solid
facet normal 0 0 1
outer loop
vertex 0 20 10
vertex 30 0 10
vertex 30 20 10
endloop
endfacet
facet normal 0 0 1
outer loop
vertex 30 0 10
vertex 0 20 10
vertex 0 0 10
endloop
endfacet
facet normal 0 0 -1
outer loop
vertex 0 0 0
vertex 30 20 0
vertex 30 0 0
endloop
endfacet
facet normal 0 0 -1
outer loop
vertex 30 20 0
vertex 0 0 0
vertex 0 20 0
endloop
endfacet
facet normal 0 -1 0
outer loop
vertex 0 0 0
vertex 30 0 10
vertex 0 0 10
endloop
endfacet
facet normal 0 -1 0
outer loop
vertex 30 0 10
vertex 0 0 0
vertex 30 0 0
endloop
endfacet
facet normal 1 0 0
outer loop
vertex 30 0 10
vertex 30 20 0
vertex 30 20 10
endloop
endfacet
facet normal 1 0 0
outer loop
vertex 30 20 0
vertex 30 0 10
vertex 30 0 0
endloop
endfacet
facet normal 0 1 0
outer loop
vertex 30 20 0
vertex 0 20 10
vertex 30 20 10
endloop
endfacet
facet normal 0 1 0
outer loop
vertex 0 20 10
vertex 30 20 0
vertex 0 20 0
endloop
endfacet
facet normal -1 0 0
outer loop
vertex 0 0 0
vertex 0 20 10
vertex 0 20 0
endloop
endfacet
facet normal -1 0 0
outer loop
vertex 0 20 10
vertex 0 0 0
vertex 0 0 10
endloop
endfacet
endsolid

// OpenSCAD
// Parametrisiertes Design für individuelle Anpassungen
module parametricBox(width, height, depth) {
    // width, height, depth: Dimensionen der Box
    cube([width, height, depth]);
}

parametricBox(30, 20, 10); // Erzeugt eine Box mit den angegebenen Dimensionen
